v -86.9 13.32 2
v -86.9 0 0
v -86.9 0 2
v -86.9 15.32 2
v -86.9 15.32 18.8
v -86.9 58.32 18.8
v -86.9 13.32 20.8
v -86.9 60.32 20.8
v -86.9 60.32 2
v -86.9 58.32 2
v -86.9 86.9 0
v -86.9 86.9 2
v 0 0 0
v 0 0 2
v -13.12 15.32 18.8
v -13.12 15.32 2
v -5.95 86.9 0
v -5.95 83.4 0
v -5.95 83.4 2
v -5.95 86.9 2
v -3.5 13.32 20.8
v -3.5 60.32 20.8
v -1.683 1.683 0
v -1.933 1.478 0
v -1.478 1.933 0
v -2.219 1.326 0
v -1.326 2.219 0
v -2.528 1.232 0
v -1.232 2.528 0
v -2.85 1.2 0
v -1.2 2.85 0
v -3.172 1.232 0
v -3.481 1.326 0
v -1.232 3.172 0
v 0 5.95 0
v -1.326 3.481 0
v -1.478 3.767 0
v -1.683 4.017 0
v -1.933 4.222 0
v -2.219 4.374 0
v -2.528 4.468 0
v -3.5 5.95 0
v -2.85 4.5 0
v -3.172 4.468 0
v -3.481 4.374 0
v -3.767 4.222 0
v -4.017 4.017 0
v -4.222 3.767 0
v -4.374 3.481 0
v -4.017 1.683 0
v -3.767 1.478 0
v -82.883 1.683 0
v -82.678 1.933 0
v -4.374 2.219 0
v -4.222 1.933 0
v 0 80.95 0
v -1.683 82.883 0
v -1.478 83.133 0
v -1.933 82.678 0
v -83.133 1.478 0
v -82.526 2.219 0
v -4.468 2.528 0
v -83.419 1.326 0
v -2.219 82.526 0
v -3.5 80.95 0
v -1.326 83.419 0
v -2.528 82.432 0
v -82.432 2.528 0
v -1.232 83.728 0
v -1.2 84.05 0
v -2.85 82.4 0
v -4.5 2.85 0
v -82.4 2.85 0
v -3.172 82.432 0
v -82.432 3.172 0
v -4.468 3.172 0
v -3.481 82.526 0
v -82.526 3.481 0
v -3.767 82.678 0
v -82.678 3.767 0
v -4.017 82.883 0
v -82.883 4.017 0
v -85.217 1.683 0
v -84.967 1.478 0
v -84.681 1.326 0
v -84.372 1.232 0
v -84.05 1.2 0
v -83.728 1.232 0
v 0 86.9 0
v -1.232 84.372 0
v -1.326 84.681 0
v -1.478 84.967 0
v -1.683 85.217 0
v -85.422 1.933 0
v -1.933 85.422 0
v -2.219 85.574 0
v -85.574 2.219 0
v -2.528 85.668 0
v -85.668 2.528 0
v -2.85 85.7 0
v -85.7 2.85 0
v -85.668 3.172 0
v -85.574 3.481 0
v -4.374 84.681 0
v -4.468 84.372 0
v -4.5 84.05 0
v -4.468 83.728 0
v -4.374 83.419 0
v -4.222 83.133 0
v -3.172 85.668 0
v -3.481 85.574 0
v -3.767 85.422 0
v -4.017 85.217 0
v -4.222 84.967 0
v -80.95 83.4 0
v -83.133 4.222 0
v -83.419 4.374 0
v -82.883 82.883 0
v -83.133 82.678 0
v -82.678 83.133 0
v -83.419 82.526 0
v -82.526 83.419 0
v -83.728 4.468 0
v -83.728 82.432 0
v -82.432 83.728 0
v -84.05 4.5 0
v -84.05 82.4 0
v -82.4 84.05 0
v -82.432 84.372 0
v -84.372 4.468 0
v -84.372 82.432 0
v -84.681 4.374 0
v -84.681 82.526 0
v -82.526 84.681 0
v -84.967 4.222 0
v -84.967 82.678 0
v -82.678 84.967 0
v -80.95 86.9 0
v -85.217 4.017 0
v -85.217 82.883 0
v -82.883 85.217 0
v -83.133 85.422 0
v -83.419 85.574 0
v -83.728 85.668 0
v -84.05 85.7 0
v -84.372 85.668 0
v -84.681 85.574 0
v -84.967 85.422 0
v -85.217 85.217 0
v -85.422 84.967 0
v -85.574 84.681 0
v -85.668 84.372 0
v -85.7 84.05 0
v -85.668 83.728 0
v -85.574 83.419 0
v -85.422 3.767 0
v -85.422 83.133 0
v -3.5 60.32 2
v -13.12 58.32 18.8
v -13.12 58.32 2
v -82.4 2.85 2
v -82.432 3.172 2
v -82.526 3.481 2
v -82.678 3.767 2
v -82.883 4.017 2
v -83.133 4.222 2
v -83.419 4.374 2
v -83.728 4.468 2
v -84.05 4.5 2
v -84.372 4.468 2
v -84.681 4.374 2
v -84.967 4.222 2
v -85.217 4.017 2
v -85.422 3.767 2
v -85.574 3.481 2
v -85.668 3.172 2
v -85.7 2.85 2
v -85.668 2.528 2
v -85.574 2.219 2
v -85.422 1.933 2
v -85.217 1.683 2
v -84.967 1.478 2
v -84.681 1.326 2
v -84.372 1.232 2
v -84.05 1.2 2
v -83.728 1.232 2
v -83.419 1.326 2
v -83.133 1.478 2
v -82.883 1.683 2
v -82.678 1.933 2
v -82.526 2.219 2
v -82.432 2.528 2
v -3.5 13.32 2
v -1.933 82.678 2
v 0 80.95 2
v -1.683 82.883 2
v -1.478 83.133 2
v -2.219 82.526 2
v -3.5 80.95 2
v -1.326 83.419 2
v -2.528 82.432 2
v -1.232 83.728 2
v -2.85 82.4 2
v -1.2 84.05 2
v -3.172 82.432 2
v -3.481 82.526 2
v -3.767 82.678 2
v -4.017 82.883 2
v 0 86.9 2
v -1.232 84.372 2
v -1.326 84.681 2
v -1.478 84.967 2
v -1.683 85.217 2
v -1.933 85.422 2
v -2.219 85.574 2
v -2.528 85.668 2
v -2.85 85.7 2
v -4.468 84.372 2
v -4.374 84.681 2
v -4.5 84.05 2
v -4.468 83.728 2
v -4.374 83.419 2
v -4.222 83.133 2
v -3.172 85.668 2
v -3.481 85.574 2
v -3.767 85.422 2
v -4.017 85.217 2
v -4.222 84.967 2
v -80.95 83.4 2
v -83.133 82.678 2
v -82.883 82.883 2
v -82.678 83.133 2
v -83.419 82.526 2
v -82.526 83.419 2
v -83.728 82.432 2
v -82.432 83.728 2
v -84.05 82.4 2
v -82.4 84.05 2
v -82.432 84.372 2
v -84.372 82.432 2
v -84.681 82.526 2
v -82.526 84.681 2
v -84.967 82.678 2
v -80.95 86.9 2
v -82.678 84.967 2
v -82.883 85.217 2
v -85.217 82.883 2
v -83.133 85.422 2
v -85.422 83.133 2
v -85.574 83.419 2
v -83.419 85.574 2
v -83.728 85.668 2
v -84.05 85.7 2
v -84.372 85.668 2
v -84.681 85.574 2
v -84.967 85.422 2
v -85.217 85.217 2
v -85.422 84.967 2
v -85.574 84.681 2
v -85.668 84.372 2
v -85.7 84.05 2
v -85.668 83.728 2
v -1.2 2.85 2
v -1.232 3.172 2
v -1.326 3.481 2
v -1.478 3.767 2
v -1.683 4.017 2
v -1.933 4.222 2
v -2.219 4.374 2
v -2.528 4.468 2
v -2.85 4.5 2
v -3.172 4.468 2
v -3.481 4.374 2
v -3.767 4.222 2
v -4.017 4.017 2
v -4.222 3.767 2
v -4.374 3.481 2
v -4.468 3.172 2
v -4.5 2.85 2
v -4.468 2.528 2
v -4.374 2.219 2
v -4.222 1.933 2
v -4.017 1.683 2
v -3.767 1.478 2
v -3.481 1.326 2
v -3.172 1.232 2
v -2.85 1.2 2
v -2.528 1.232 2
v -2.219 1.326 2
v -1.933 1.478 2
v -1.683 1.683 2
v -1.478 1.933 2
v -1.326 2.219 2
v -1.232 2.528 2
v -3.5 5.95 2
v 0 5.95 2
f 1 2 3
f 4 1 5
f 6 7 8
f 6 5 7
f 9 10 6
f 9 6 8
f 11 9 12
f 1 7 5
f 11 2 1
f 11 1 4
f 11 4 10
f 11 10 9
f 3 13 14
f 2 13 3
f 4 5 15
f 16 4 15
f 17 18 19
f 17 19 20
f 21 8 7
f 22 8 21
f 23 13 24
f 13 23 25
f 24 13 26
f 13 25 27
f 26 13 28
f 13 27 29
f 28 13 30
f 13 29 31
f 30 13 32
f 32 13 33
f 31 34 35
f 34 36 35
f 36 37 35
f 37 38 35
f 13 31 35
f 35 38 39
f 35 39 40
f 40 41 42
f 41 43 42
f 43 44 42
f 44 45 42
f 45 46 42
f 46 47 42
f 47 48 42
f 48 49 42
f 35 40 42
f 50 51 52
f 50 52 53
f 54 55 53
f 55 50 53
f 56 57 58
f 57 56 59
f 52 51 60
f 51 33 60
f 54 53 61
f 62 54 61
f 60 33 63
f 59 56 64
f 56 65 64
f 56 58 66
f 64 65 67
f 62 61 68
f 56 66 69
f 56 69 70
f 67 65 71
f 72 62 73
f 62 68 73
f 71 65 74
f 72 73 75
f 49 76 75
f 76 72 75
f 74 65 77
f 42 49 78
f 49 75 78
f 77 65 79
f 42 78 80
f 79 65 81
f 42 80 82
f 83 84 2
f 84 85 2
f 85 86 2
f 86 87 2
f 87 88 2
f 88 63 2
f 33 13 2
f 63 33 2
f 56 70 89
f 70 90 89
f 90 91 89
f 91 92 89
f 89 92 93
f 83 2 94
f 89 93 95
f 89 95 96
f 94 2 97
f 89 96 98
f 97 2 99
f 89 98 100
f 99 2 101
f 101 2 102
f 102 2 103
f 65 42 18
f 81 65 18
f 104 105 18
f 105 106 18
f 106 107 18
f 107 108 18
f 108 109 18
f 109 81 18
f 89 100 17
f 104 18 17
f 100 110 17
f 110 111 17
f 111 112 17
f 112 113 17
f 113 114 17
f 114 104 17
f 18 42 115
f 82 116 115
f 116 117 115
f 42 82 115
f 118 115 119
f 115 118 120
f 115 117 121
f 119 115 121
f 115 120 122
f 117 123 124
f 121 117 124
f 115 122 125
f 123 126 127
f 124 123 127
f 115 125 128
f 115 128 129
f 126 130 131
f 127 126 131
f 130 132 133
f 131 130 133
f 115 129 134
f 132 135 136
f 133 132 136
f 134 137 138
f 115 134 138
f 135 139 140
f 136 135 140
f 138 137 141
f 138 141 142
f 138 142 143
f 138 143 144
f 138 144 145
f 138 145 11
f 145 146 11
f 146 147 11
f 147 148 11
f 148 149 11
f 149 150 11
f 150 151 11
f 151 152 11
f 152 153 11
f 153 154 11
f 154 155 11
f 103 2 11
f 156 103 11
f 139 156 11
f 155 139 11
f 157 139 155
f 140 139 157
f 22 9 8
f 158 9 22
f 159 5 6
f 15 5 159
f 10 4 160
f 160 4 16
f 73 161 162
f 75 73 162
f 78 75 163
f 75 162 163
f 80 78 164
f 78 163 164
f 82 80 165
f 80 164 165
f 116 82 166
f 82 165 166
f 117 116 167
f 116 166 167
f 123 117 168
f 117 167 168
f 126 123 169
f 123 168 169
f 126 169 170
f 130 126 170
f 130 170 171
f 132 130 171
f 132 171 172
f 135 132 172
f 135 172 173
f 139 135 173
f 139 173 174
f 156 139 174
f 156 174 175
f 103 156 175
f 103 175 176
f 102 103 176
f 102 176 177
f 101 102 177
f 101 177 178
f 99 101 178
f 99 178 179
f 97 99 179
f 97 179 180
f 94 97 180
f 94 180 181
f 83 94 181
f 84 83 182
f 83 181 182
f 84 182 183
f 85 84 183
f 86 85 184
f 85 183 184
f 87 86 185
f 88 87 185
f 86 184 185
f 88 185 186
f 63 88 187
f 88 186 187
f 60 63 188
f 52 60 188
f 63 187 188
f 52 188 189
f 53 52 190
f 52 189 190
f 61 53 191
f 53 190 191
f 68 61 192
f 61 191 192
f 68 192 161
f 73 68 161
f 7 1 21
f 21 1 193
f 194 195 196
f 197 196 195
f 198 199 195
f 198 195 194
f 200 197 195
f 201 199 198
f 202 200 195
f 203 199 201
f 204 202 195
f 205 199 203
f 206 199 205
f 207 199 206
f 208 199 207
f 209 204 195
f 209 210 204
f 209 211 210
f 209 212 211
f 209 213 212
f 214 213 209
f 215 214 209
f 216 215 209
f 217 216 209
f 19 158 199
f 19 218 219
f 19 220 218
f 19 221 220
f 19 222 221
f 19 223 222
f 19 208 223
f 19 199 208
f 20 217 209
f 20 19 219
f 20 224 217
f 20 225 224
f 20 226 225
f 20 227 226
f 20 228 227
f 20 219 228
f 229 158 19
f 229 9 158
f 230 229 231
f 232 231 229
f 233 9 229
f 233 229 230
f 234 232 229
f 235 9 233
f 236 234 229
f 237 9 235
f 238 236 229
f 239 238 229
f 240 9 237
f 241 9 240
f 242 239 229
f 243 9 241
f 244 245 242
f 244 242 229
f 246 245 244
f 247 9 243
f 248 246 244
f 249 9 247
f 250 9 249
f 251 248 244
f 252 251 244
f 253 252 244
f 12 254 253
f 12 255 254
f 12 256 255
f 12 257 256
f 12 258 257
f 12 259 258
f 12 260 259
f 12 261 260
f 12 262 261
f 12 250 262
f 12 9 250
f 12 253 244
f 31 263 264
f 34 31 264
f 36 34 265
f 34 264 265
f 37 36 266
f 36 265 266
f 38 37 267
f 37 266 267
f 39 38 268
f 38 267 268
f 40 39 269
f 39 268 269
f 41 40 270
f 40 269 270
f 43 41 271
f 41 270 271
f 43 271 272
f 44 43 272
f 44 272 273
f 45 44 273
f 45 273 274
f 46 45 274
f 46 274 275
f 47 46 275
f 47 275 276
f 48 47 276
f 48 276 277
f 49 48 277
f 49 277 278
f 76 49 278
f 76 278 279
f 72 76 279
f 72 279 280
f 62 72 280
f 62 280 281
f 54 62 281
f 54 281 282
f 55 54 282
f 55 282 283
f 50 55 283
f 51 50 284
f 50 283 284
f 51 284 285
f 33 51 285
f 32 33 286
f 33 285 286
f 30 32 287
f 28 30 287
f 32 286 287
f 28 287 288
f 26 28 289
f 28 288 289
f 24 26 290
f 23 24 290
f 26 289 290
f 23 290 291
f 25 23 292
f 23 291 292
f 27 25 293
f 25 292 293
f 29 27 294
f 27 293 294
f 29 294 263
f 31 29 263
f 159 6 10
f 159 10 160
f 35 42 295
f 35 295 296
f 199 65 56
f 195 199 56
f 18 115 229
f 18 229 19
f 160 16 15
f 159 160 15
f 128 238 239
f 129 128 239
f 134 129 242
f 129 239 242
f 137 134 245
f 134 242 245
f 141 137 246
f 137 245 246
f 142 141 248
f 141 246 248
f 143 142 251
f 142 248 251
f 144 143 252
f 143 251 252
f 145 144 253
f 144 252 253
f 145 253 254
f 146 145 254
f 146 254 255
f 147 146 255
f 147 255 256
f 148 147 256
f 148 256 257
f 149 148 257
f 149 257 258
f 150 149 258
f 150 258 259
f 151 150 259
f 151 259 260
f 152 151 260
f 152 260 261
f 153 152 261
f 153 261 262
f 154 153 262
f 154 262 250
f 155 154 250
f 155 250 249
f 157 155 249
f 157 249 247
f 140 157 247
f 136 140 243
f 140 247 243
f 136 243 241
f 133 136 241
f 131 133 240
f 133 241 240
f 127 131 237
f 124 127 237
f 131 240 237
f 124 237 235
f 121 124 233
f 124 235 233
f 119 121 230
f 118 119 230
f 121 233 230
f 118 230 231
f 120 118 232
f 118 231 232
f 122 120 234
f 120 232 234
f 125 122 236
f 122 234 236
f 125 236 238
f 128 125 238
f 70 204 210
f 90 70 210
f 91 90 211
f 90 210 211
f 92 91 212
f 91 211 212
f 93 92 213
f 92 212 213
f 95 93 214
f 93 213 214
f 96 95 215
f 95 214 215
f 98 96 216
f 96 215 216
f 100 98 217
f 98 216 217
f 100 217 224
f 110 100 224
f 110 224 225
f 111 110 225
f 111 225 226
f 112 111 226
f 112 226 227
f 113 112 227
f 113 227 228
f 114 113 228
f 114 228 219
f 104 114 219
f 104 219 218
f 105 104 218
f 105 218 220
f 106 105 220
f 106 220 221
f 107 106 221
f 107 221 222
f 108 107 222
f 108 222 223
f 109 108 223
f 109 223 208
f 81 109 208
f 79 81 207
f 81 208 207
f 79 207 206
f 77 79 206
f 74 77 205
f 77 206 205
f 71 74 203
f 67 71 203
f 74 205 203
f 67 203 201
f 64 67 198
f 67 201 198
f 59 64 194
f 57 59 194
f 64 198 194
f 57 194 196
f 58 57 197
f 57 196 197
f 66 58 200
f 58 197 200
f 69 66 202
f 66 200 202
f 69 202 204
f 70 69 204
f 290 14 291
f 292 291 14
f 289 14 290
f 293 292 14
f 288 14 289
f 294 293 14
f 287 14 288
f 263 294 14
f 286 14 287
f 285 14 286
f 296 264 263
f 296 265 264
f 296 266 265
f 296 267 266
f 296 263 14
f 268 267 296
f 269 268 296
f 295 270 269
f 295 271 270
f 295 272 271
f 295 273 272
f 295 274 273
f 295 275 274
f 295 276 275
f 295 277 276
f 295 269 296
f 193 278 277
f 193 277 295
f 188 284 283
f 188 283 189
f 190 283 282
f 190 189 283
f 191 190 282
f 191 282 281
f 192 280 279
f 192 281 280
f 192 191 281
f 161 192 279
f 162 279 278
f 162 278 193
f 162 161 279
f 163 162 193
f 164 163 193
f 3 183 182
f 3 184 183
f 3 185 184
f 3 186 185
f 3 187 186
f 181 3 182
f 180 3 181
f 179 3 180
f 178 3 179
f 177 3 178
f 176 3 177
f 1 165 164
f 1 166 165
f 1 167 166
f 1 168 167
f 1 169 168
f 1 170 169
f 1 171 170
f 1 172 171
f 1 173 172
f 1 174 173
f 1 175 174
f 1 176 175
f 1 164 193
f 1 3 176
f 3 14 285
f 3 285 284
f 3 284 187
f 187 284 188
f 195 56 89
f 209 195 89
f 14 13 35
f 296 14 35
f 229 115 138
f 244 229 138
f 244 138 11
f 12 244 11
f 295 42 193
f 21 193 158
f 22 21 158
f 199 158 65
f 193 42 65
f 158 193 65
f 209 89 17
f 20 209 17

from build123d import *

# Parameters (mm, degrees)
SKETCH1_W               = 86.9
SKETCH1_H               = 86.9
BOSS_EXTRUDE1_DEPTH     = 2
SKETCH2_R               = 1.65
CUT_EXTRUDE3_DEPTH      = 123.911431527
SKETCH5_W               = 86.9
SKETCH5_H               = 47
BOSS_EXTRUDE3_DEPTH     = 18.8
CUT_EXTRUDE5_START      = -2
SKETCH6_W               = 73.78
SKETCH6_H               = 16.8
CUT_EXTRUDE5_DEPTH      = 43
CUT_EXTRUDE7_DEPTH      = 125.324816509
CUT_EXTRUDE7_DEPTH_BACK = 125.324816509
SKETCH8_W               = 3.5
SKETCH8_H               = 75
SKETCH8_W_2             = 75
SKETCH8_H_2             = 3.5


with BuildPart() as part:
    # Sketch1 → Boss-Extrude1 (new body)
    with BuildSketch(Plane(origin=(0, 0, 0), x_dir=(0, 1, 0), z_dir=(0, 0, 1))):
        with Locations((43.45, 43.45)):
            Rectangle(SKETCH1_W, SKETCH1_H)
    extrude(amount=BOSS_EXTRUDE1_DEPTH)

    # Sketch2 → Cut-Extrude3 (cut, through all)
    with BuildSketch(Plane.XY.offset(2)):
        with Locations((-84.05, 2.85)):
            Circle(SKETCH2_R)
        with Locations((-2.85, 2.85)):
            Circle(SKETCH2_R)
        with Locations((-2.85, 84.05)):
            Circle(SKETCH2_R)
        with Locations((-84.05, 84.05)):
            Circle(SKETCH2_R)
    extrude(amount=-CUT_EXTRUDE3_DEPTH, mode=Mode.SUBTRACT)

    # Sketch5 → Boss-Extrude3 (add)
    with BuildSketch(Plane.XY.offset(2)):
        with Locations((-43.45, 36.82)):
            Rectangle(SKETCH5_W, SKETCH5_H)
    extrude(amount=BOSS_EXTRUDE3_DEPTH)

    # Sketch6 → Cut-Extrude5 (cut)
    with BuildSketch(Plane.XZ.offset(-13.32).offset(CUT_EXTRUDE5_START)):
        with Locations((-50.01, 10.4)):
            Rectangle(SKETCH6_W, SKETCH6_H)
    extrude(amount=-CUT_EXTRUDE5_DEPTH, mode=Mode.SUBTRACT)

    # Sketch8 → Cut-Extrude7 (cut, two sides: drawn at the far end of the back side and taken through both)
    with BuildSketch(Plane.XY.offset(2).offset(-CUT_EXTRUDE7_DEPTH_BACK)):
        with Locations((-1.75, 43.45)):
            Rectangle(SKETCH8_W, SKETCH8_H)
        with Locations((-43.45, 85.15)):
            Rectangle(SKETCH8_W_2, SKETCH8_H_2)
    extrude(amount=CUT_EXTRUDE7_DEPTH + CUT_EXTRUDE7_DEPTH_BACK, mode=Mode.SUBTRACT)


solid = part.part
